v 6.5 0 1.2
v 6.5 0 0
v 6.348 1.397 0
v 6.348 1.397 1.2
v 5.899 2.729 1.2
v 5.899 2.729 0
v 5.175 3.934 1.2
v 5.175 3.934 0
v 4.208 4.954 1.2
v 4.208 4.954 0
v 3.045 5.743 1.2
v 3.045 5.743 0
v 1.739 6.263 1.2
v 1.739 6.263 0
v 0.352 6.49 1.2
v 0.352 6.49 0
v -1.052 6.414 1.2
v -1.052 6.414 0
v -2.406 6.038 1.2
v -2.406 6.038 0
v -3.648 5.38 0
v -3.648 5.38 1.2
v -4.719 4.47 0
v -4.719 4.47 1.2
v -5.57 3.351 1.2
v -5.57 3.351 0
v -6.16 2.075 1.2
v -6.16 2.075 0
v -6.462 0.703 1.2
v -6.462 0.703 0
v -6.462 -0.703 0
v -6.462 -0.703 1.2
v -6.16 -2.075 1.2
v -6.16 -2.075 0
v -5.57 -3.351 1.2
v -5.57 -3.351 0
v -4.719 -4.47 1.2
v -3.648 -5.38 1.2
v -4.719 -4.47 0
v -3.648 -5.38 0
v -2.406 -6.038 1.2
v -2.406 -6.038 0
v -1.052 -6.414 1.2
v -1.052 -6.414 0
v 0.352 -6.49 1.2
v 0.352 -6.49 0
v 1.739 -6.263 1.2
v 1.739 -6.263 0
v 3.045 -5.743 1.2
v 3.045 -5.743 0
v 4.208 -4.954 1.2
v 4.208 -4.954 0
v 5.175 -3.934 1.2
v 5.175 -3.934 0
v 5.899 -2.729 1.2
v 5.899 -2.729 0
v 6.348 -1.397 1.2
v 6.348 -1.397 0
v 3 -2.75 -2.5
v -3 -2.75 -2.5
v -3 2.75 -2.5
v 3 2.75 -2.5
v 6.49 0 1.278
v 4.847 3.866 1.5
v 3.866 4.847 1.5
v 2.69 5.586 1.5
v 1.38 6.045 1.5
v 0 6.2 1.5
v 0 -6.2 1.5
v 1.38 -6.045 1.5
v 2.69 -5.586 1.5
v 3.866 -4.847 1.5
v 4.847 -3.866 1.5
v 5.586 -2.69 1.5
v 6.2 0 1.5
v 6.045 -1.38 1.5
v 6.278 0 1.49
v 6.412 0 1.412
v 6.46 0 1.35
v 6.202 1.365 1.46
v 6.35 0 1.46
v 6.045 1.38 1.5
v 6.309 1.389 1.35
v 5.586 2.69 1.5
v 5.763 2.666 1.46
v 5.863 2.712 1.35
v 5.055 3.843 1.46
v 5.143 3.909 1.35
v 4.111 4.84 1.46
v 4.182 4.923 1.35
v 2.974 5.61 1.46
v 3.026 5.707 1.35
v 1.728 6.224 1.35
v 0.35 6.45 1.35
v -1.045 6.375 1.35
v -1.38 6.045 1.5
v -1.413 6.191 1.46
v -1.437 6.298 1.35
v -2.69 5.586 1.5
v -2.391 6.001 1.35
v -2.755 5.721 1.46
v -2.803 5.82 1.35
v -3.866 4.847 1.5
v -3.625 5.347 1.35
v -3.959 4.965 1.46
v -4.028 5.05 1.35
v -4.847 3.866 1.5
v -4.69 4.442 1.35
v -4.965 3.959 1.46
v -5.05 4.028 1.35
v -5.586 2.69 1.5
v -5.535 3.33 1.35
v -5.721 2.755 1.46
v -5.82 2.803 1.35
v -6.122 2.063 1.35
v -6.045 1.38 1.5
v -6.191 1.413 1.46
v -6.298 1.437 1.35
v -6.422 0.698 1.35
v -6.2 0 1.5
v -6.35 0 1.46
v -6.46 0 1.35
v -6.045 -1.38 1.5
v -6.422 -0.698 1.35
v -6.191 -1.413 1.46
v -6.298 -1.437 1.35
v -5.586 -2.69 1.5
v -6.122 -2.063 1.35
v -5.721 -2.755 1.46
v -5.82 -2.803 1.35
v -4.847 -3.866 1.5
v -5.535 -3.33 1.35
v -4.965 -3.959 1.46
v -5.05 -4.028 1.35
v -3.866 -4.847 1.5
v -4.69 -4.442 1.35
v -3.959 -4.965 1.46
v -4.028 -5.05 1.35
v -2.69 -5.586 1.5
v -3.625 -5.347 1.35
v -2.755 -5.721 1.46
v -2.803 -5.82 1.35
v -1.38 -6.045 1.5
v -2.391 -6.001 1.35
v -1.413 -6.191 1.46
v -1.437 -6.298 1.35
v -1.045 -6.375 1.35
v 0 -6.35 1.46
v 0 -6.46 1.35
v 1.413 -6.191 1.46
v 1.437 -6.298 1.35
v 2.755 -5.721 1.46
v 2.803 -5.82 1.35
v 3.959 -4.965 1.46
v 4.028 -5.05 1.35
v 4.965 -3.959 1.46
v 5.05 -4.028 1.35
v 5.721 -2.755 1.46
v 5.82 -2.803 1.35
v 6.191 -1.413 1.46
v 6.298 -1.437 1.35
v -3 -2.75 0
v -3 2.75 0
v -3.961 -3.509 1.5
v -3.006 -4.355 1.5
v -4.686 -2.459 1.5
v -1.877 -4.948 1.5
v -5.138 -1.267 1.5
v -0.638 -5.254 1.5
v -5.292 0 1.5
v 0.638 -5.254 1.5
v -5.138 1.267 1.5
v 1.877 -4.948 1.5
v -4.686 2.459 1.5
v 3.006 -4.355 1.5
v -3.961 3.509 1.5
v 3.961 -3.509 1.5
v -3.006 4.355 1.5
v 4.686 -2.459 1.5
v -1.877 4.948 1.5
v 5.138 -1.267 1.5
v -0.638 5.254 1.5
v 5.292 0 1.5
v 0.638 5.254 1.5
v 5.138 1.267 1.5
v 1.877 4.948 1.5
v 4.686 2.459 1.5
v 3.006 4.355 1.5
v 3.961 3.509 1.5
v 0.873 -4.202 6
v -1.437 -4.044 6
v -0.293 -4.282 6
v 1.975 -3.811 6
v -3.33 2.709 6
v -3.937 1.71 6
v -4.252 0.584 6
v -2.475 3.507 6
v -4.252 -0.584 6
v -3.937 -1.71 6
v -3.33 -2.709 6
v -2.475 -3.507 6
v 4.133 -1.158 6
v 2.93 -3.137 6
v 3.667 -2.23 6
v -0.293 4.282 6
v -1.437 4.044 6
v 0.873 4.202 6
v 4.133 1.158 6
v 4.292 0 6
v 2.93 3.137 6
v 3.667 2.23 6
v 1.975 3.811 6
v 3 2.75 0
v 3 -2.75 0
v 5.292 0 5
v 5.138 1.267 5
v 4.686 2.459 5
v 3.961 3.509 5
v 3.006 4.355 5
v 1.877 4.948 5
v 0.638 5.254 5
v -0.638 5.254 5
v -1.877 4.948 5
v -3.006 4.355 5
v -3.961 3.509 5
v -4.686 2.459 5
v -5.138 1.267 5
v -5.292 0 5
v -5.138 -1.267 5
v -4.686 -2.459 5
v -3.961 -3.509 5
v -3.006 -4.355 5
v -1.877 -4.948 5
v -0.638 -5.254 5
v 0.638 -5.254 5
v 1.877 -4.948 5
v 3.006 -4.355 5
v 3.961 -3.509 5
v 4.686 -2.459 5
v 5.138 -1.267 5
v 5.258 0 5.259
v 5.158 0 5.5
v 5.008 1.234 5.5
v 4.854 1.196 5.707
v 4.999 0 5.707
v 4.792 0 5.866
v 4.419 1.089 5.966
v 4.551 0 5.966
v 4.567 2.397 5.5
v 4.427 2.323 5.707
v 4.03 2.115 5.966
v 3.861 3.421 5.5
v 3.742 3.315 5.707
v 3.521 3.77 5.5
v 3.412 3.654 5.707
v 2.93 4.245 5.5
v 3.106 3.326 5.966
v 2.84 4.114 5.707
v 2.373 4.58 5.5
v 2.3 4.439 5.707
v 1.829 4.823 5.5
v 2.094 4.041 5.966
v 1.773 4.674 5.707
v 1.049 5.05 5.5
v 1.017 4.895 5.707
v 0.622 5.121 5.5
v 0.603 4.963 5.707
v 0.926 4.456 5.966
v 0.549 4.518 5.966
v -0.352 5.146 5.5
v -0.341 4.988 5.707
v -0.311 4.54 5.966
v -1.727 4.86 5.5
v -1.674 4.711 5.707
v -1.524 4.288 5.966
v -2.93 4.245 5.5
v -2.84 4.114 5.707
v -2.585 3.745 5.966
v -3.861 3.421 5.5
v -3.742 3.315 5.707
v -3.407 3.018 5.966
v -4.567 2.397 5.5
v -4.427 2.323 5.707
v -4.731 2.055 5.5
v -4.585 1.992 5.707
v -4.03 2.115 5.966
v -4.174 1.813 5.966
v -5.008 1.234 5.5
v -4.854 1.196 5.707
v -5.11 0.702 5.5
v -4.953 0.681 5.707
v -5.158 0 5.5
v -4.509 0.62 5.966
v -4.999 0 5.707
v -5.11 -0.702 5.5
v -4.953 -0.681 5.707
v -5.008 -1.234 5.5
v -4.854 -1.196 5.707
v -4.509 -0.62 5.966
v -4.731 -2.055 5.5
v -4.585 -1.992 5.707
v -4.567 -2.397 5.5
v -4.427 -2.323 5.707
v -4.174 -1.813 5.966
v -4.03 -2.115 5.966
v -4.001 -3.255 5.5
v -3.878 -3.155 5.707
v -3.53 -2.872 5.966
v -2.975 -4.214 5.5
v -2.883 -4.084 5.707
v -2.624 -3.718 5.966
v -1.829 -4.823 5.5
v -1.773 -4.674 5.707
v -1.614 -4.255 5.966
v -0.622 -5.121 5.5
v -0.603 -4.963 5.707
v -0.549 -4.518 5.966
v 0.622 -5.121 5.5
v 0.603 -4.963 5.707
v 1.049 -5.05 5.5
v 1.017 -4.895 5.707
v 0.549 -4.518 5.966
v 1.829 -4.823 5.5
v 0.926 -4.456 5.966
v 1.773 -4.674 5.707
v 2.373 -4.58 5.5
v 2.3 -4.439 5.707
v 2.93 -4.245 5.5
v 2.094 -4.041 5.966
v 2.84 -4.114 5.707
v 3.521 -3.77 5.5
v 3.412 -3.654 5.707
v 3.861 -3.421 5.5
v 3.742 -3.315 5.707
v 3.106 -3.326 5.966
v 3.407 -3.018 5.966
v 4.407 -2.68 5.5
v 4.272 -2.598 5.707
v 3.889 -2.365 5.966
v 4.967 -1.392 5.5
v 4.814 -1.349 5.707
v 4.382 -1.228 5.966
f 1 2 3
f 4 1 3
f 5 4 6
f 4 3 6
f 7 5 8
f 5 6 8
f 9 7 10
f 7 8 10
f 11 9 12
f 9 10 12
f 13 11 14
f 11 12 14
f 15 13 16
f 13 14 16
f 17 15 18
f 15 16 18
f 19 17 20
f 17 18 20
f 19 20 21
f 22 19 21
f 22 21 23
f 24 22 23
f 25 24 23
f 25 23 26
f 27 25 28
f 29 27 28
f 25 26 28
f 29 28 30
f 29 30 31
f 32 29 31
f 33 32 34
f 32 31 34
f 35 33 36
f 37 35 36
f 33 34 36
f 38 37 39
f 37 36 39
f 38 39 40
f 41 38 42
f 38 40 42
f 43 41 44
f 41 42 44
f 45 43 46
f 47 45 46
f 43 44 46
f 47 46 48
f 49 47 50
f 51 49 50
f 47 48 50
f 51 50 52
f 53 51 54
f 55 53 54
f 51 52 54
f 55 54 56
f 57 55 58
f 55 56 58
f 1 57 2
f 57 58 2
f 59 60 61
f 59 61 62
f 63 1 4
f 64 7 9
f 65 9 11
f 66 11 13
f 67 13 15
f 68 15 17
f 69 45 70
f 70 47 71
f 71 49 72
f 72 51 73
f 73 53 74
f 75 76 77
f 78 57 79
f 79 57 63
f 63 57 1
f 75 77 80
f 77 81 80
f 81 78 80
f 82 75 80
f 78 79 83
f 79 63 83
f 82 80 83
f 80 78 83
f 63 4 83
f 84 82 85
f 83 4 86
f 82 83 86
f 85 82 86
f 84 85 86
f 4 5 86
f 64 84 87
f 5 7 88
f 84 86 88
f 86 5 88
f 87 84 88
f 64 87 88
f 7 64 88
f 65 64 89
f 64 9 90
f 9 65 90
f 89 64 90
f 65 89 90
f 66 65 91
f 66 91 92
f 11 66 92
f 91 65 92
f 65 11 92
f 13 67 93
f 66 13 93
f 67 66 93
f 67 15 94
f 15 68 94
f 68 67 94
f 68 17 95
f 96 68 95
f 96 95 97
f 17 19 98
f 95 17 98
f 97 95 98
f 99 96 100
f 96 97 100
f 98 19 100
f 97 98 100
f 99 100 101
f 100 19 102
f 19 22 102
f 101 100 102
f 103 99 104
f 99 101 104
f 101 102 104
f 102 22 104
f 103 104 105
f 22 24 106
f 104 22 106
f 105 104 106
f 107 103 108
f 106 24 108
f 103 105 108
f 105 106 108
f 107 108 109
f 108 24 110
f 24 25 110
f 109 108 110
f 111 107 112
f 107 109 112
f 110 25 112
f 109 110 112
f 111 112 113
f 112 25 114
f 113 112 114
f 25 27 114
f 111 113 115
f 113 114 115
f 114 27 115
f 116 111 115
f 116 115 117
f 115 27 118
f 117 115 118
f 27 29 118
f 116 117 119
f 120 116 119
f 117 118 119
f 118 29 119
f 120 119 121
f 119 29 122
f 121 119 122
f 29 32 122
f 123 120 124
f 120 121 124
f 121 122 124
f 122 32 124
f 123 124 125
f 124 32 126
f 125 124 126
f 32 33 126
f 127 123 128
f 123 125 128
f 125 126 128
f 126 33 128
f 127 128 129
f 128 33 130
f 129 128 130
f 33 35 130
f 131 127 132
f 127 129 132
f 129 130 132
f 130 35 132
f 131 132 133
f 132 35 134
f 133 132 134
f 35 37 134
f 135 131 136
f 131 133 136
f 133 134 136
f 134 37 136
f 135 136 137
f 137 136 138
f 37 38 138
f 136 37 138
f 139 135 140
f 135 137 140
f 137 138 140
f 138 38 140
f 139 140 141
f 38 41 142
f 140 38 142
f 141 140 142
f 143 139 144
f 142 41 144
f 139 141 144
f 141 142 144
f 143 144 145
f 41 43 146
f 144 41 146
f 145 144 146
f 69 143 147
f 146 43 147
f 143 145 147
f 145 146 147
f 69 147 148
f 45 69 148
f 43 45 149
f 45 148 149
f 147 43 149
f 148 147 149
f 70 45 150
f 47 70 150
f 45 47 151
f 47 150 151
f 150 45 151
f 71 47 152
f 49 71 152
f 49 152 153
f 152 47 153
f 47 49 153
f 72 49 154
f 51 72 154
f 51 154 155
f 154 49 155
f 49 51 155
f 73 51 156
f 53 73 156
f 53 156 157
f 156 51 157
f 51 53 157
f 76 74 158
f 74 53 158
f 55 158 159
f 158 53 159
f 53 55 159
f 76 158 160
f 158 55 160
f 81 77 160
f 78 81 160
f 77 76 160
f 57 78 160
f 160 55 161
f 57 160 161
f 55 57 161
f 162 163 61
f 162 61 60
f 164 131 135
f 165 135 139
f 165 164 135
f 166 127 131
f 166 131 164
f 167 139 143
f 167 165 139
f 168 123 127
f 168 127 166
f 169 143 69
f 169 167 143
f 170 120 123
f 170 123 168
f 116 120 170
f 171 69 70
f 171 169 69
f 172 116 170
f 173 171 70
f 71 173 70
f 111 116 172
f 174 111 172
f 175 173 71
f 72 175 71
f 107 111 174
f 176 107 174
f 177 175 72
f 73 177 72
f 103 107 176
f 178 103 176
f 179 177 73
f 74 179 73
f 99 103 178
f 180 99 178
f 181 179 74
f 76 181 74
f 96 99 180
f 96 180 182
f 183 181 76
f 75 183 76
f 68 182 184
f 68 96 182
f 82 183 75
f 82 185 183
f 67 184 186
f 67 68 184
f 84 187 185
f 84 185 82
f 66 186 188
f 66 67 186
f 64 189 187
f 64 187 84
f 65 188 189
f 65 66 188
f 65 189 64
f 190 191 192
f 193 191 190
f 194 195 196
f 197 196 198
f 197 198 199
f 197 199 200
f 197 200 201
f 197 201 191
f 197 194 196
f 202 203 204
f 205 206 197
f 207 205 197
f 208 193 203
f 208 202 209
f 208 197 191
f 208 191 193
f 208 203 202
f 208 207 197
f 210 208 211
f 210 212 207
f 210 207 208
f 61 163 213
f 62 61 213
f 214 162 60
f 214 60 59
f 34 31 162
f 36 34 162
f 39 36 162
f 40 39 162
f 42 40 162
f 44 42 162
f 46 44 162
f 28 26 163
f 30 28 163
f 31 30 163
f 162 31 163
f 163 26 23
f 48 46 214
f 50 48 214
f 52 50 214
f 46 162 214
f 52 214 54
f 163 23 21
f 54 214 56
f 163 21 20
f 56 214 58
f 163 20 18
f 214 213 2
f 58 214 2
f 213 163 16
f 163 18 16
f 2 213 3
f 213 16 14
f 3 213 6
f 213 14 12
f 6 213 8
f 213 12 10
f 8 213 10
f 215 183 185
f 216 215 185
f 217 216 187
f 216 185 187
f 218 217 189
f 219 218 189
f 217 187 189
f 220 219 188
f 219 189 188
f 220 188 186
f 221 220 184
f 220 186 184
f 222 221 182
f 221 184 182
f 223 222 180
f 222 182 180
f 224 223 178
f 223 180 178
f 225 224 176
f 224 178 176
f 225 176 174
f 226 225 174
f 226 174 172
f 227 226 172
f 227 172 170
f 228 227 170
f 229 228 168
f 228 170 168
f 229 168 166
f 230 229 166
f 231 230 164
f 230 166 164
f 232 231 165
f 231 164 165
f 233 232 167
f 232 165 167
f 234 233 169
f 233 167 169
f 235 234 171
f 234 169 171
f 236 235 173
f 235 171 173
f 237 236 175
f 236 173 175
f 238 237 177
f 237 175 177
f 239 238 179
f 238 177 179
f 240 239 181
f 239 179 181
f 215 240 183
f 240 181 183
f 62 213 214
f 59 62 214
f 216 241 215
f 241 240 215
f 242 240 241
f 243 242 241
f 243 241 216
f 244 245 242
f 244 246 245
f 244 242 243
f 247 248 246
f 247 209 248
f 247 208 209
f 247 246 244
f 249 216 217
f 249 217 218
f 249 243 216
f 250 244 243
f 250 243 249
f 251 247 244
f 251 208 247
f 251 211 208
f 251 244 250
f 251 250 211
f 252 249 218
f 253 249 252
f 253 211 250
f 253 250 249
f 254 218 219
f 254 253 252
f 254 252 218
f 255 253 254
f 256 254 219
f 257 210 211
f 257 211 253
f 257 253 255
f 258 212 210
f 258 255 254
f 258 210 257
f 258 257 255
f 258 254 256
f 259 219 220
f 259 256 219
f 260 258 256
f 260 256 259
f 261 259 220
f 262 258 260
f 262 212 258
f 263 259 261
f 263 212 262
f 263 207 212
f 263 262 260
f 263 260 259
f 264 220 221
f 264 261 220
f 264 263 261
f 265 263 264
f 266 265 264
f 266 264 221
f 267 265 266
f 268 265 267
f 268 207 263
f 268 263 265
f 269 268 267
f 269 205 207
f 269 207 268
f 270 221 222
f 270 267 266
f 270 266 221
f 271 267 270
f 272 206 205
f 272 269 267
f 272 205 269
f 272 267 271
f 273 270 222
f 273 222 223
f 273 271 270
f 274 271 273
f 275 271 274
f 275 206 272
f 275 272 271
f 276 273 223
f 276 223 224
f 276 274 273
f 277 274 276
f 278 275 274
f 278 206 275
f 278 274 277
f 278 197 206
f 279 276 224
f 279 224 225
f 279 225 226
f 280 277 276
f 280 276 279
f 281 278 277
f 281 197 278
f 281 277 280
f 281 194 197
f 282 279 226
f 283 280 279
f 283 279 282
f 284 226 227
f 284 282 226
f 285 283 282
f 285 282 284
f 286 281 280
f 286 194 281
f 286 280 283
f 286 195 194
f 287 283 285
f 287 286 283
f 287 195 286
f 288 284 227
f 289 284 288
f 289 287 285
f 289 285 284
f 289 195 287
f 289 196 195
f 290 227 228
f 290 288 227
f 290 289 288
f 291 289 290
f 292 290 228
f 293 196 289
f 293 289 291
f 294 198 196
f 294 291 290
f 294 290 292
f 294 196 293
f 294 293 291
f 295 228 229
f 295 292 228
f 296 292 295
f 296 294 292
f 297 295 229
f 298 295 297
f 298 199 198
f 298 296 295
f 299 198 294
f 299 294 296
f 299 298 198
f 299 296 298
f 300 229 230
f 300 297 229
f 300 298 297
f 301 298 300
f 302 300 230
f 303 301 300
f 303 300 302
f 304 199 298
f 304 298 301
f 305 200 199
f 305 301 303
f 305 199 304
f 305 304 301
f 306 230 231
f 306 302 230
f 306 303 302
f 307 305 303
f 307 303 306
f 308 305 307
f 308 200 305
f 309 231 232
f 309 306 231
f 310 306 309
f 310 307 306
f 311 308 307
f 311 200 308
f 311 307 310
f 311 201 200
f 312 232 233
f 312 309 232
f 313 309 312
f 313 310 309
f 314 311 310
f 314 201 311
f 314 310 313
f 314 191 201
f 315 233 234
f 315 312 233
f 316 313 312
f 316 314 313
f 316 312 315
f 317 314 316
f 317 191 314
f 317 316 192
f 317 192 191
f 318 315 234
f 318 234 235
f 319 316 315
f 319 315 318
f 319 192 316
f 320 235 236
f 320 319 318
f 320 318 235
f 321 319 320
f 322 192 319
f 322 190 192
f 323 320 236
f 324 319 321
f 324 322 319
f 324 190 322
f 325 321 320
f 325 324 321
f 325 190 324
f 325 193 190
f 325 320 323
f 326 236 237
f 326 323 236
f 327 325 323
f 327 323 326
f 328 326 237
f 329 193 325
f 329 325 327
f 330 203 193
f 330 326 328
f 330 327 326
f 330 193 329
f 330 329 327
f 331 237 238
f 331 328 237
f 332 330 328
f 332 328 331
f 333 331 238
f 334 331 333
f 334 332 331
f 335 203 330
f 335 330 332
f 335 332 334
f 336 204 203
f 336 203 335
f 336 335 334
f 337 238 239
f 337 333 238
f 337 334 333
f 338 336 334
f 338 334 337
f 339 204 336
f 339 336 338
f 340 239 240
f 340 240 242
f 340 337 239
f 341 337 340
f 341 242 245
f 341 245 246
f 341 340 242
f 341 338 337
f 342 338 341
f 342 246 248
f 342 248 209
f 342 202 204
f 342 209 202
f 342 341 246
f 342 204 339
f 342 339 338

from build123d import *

# Parameters (mm, degrees)
SKETCH_R     = 6.5
PAD_DEPTH    = 1.5
SKETCH001_R  = 5.292227
PAD001_DEPTH = 4.5
FILLET_R     = 1
FILLET001_R  = 0.3
SKETCH002_W  = 6
SKETCH002_H  = 5.5
PAD002_DEPTH = 2.5


with BuildPart() as part:
    # Sketch → Pad (new body)
    with BuildSketch(Plane.XY):
        Circle(SKETCH_R)
    extrude(amount=PAD_DEPTH)

    # Sketch001 → Pad001 (new body)
    with BuildSketch(Plane.XY.offset(1.5)):
        Circle(SKETCH001_R)
    extrude(amount=PAD001_DEPTH)

    # Fillet
    fillet_edges = [part.edges().sort_by_distance(p)[0] for p in [
        (-5.292227, 0, 6),
    ]]
    fillet(fillet_edges, radius=FILLET_R)

    # Fillet001
    fillet001_edges = [part.edges().sort_by_distance(p)[0] for p in [
        (-6.5, 0, 1.5),
    ]]
    fillet(fillet001_edges, radius=FILLET001_R)

    # Sketch002 → Pad002 (new body)
    with BuildSketch(Plane(origin=(0, 0, 0), x_dir=(1, 0, 0), z_dir=(0, 0, -1))):
        Rectangle(SKETCH002_W, SKETCH002_H)
    extrude(amount=PAD002_DEPTH)


solid = part.part
